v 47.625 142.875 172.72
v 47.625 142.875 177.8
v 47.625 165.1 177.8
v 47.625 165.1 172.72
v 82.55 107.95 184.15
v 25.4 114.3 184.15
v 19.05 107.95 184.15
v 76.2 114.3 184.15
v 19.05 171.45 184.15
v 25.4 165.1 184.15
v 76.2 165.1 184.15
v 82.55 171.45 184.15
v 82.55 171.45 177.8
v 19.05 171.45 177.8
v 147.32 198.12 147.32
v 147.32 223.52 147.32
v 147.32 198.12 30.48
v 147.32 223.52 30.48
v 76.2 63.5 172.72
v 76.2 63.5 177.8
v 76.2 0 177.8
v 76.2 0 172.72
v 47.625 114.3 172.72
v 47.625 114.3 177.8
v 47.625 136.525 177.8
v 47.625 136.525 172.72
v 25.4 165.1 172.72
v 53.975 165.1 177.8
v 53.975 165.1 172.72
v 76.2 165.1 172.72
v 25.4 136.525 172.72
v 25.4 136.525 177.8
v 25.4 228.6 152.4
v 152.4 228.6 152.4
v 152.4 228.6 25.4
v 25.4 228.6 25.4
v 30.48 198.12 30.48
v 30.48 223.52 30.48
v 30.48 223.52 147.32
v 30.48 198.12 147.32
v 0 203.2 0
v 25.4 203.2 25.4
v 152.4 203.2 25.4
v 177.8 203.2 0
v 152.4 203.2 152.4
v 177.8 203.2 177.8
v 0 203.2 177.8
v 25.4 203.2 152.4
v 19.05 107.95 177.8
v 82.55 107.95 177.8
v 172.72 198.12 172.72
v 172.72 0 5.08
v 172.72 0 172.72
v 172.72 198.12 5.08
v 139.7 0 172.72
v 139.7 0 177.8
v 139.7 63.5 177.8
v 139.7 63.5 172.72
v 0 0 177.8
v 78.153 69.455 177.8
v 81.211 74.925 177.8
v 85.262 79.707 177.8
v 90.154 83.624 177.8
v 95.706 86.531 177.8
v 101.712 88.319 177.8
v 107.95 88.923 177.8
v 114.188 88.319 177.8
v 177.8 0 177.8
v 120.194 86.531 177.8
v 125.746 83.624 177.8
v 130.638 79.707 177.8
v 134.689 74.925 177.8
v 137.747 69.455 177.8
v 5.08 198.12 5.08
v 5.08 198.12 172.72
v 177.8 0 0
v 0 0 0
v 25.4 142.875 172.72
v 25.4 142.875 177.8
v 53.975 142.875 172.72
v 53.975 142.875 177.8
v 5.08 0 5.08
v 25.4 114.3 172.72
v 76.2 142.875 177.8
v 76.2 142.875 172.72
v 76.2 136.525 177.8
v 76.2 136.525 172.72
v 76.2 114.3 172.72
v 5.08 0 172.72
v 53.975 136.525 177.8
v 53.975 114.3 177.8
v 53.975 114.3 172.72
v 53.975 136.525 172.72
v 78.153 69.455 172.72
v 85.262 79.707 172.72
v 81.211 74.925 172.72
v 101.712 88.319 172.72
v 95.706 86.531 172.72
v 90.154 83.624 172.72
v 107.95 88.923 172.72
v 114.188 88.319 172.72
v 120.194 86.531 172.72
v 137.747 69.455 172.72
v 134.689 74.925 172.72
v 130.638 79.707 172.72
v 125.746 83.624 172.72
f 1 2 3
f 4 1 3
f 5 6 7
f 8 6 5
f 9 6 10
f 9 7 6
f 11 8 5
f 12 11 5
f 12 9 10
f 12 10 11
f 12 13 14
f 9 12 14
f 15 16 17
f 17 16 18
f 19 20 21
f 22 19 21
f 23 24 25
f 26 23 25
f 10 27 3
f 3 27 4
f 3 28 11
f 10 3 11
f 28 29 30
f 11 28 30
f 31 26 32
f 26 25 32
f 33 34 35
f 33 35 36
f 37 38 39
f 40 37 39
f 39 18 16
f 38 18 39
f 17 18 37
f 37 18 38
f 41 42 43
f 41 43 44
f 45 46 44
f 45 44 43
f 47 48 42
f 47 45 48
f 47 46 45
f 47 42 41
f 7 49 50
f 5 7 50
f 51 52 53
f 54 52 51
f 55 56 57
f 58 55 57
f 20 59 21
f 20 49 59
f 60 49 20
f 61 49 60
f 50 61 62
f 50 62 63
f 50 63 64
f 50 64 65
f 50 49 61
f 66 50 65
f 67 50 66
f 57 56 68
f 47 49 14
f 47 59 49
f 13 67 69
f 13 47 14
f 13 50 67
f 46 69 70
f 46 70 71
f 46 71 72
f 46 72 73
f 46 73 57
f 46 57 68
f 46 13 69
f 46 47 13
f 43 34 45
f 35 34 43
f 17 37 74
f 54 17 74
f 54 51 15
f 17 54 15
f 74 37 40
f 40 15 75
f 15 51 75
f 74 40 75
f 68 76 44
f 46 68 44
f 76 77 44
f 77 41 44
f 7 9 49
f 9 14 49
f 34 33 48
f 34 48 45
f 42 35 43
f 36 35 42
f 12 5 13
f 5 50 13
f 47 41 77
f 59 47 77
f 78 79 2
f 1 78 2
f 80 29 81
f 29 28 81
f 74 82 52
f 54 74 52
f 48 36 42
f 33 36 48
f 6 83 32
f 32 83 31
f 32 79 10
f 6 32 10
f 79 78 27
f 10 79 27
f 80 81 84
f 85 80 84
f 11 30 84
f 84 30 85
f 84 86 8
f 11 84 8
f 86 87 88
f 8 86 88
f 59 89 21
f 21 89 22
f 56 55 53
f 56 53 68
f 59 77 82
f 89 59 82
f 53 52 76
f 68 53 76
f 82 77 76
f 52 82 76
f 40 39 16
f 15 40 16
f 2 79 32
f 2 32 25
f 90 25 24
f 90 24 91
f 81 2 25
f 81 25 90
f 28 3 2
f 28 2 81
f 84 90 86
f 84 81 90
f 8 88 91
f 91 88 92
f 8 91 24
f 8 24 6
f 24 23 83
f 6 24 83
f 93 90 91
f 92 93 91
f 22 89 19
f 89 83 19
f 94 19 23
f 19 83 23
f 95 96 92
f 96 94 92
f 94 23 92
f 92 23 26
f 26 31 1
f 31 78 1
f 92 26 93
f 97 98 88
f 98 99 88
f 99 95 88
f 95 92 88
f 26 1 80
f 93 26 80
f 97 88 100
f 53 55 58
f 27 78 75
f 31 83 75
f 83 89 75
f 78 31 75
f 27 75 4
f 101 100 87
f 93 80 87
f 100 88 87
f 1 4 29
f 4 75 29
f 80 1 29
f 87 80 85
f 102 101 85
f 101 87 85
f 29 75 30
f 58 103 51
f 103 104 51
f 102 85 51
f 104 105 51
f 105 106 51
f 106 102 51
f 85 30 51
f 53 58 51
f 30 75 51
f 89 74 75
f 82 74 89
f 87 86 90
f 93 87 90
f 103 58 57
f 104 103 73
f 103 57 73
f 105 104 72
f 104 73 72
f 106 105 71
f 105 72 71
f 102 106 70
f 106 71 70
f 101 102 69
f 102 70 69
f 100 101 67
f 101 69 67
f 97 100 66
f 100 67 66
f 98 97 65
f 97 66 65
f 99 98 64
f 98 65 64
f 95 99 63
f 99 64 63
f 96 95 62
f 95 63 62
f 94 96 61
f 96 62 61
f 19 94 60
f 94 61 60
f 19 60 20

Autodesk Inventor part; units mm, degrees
ref_plane "YZ Plane" through (0, 0, 0) normal (1, 0, 0) x (0, 1, 0)
ref_plane "XZ Plane" through (0, 0, 0) normal (0, 1, 0) x (-1, 0, 0)
ref_plane "XY Plane" through (0, 0, 0) normal (0, 0, 1) x (1, 0, 0)
sketch "Sketch1" plane through (0, 0, 0) normal (0, 0, 1) x (1, 0, 0)
  line L0 (0, 0) -> (177.8, 0)
  line L1 (177.8, 0) -> (177.8, 203.2)
  line L2 (177.8, 203.2) -> (0, 203.2)
  line L3 (0, 203.2) -> (0, 0)
  line L4 (0, 203.2) -> (25.4, 203.2) construction
  line L5 (177.8, 203.2) -> (203.2, 203.2) construction
  line L6 (0, 203.2) -> (177.8, 203.2)
  line L7 (177.8, 203.2) -> (177.8, 228.6)
  line L8 (177.8, 228.6) -> (0, 228.6)
  line L9 (0, 228.6) -> (0, 203.2)
  dimension "d0" = 177.8
  dimension "d1" = 203.2
  dimension "d6" = 177.8
  dimension "d7" = 25.4
extrude "Extrusion1" add sketch "Sketch1" along normal blind 177.8
sketch "Sketch2" plane through (0, 0, 177.8) normal (0, 0, 1) x (1, 0, 0)
  line L0 (177.8, 228.6) -> (0, 228.6) projected
  line L1 (0, 228.6) -> (177.8, 228.6)
  line L2 (177.8, 228.6) -> (177.8, 203.2)
  line L3 (177.8, 203.2) -> (0, 203.2)
  line L4 (0, 203.2) -> (0, 228.6)
  point P0 (0, 0)
  dimension "d10" = 177.8
  dimension "d11" = 25.4
extrude "Extrusion2" cut sketch "Sketch2" against normal blind 25.4
sketch "Sketch3" plane through (177.8, 0, 0) normal (1, 0, 0) x (0, 0, -1)
  line L0 (0, 0) -> (0, 228.6) projected
  line L1 (-177.8, 0) -> (-177.8, 203.2) projected
  line L2 (0, 228.6) -> (-177.8, 228.6)
  line L3 (-177.8, 228.6) -> (-177.8, 203.2)
  line L4 (-177.8, 203.2) -> (0, 203.2)
  line L5 (0, 203.2) -> (0, 228.6)
  dimension "d14" = 177.8
  dimension "d15" = 25.4
extrude "Extrusion3" cut sketch "Sketch3" against normal blind 25.4
sketch "Sketch4" plane through (0, 0, 0) normal (0, 0, -1) x (-1, 0, 0)
  line L0 (0, 228.6) -> (0, 0) projected
  line L1 (-152.4, 203.2) -> (-177.8, 203.2) projected
  line L2 (0, 228.6) -> (-177.8, 228.6)
  line L3 (-177.8, 228.6) -> (-177.8, 203.2)
  line L4 (-177.8, 203.2) -> (0, 203.2)
  line L5 (0, 203.2) -> (0, 228.6)
  dimension "d18" = 177.8
  dimension "d19" = 25.4
extrude "Extrusion4" cut sketch "Sketch4" against normal blind 25.4
sketch "Sketch5" plane through (0, 0, 0) normal (-1, 0, 0) x (0, 0, 1)
  line L0 (177.8, 228.6) -> (0, 228.6)
  line L1 (0, 228.6) -> (0, 203.2)
  line L2 (0, 203.2) -> (177.8, 203.2)
  line L3 (177.8, 203.2) -> (177.8, 228.6)
  line L4 (177.8, 203.2) -> (177.8, 0) projected
  line L5 (25.4, 228.6) -> (152.4, 228.6) projected
  point P0 (0, 0)
  dimension "d22" = 177.8
  dimension "d23" = 25.4
  dimension "d24" = 0
  dimension "d25" = 0
extrude "Extrusion5" cut sketch "Sketch5" against normal blind 25.4
shell "Shell1" thickness 5.08 removed faces 1 at (59.2667, 0, 59.2667)
sketch "Sketch6" plane through (0, 0, 177.8) normal (0, 0, 1) x (1, 0, 0)
  line L0 (25.4, 165.1) -> (76.2, 165.1)
  line L1 (76.2, 165.1) -> (76.2, 114.3)
  line L2 (76.2, 114.3) -> (25.4, 114.3)
  line L3 (25.4, 114.3) -> (25.4, 165.1)
  line L4 (177.8, 203.2) -> (0, 203.2) projected
  line L5 (0, 203.2) -> (0, 0) projected
  line L6 (47.625, 165.1) -> (53.975, 165.1)
  line L7 (53.975, 114.3) -> (47.625, 114.3)
  line L8 (76.2, 142.875) -> (76.2, 136.525)
  line L9 (25.4, 136.525) -> (25.4, 142.875)
  line L10 (47.625, 114.3) -> (47.625, 136.525)
  line L11 (47.625, 142.875) -> (47.625, 165.1)
  line L12 (25.4, 142.875) -> (47.625, 142.875)
  line L13 (53.975, 142.875) -> (76.2, 142.875)
  line L14 (53.975, 165.1) -> (53.975, 142.875)
  line L15 (53.975, 136.525) -> (53.975, 114.3)
  line L16 (76.2, 136.525) -> (53.975, 136.525)
  line L17 (47.625, 136.525) -> (25.4, 136.525)
  line L18 (82.55, 171.45) -> (19.05, 171.45)
  line L19 (19.05, 171.45) -> (19.05, 107.95)
  line L20 (19.05, 107.95) -> (82.55, 107.95)
  line L21 (82.55, 107.95) -> (82.55, 171.45)
  dimension "d29" = 50.8
  dimension "d30" = 50.8
  dimension "d31" = 38.1
  dimension "d32" = 25.4
  dimension "d33" = 6.35
  dimension "d34" = 50.8
  dimension "d36" = 50.8
  dimension "d37" = 6.35
  dimension "d39" = 6.35
extrude "Extrusion6" cut sketch "Sketch6" against normal blind 25.4 contours L0 L11 L12 L3 | L0 L1 L13 L14 | L17 L10 L2 L3 | L1 L2 L15 L16
extrude "Extrusion7" add sketch "Sketch6" along normal blind 6.35
sketch "Sketch7" plane through (0, 0, 177.8) normal (0, 0, 1) x (1, 0, 0)
  line L0 (0, 0) -> (177.8, 0) projected
  line L1 (76.2, 0) -> (139.7, 0)
  line L2 (139.7, 0) -> (139.7, 88.9)
  line L3 (139.7, 88.9) -> (76.2, 88.9)
  line L4 (76.2, 88.9) -> (76.2, 0)
  line L5 (177.8, 0) -> (177.8, 203.2) projected
  line L6 (76.2, 0) -> (76.2, 63.5)
  arc A0 (139.7, 63.5) -> (76.2, 63.5) centre (107.95, 56.3852) ccw
  dimension "d44" = 63.5
  dimension "d45" = 88.9
  dimension "d46" = 38.1
  dimension "d47" = 63.5
  dimension "d48" = 32.5374
extrude "Extrusion8" cut sketch "Sketch7" against normal blind 6.35 contours L4 A0 L3 L2 L0 | A0 L3
properties part number "House Model"
